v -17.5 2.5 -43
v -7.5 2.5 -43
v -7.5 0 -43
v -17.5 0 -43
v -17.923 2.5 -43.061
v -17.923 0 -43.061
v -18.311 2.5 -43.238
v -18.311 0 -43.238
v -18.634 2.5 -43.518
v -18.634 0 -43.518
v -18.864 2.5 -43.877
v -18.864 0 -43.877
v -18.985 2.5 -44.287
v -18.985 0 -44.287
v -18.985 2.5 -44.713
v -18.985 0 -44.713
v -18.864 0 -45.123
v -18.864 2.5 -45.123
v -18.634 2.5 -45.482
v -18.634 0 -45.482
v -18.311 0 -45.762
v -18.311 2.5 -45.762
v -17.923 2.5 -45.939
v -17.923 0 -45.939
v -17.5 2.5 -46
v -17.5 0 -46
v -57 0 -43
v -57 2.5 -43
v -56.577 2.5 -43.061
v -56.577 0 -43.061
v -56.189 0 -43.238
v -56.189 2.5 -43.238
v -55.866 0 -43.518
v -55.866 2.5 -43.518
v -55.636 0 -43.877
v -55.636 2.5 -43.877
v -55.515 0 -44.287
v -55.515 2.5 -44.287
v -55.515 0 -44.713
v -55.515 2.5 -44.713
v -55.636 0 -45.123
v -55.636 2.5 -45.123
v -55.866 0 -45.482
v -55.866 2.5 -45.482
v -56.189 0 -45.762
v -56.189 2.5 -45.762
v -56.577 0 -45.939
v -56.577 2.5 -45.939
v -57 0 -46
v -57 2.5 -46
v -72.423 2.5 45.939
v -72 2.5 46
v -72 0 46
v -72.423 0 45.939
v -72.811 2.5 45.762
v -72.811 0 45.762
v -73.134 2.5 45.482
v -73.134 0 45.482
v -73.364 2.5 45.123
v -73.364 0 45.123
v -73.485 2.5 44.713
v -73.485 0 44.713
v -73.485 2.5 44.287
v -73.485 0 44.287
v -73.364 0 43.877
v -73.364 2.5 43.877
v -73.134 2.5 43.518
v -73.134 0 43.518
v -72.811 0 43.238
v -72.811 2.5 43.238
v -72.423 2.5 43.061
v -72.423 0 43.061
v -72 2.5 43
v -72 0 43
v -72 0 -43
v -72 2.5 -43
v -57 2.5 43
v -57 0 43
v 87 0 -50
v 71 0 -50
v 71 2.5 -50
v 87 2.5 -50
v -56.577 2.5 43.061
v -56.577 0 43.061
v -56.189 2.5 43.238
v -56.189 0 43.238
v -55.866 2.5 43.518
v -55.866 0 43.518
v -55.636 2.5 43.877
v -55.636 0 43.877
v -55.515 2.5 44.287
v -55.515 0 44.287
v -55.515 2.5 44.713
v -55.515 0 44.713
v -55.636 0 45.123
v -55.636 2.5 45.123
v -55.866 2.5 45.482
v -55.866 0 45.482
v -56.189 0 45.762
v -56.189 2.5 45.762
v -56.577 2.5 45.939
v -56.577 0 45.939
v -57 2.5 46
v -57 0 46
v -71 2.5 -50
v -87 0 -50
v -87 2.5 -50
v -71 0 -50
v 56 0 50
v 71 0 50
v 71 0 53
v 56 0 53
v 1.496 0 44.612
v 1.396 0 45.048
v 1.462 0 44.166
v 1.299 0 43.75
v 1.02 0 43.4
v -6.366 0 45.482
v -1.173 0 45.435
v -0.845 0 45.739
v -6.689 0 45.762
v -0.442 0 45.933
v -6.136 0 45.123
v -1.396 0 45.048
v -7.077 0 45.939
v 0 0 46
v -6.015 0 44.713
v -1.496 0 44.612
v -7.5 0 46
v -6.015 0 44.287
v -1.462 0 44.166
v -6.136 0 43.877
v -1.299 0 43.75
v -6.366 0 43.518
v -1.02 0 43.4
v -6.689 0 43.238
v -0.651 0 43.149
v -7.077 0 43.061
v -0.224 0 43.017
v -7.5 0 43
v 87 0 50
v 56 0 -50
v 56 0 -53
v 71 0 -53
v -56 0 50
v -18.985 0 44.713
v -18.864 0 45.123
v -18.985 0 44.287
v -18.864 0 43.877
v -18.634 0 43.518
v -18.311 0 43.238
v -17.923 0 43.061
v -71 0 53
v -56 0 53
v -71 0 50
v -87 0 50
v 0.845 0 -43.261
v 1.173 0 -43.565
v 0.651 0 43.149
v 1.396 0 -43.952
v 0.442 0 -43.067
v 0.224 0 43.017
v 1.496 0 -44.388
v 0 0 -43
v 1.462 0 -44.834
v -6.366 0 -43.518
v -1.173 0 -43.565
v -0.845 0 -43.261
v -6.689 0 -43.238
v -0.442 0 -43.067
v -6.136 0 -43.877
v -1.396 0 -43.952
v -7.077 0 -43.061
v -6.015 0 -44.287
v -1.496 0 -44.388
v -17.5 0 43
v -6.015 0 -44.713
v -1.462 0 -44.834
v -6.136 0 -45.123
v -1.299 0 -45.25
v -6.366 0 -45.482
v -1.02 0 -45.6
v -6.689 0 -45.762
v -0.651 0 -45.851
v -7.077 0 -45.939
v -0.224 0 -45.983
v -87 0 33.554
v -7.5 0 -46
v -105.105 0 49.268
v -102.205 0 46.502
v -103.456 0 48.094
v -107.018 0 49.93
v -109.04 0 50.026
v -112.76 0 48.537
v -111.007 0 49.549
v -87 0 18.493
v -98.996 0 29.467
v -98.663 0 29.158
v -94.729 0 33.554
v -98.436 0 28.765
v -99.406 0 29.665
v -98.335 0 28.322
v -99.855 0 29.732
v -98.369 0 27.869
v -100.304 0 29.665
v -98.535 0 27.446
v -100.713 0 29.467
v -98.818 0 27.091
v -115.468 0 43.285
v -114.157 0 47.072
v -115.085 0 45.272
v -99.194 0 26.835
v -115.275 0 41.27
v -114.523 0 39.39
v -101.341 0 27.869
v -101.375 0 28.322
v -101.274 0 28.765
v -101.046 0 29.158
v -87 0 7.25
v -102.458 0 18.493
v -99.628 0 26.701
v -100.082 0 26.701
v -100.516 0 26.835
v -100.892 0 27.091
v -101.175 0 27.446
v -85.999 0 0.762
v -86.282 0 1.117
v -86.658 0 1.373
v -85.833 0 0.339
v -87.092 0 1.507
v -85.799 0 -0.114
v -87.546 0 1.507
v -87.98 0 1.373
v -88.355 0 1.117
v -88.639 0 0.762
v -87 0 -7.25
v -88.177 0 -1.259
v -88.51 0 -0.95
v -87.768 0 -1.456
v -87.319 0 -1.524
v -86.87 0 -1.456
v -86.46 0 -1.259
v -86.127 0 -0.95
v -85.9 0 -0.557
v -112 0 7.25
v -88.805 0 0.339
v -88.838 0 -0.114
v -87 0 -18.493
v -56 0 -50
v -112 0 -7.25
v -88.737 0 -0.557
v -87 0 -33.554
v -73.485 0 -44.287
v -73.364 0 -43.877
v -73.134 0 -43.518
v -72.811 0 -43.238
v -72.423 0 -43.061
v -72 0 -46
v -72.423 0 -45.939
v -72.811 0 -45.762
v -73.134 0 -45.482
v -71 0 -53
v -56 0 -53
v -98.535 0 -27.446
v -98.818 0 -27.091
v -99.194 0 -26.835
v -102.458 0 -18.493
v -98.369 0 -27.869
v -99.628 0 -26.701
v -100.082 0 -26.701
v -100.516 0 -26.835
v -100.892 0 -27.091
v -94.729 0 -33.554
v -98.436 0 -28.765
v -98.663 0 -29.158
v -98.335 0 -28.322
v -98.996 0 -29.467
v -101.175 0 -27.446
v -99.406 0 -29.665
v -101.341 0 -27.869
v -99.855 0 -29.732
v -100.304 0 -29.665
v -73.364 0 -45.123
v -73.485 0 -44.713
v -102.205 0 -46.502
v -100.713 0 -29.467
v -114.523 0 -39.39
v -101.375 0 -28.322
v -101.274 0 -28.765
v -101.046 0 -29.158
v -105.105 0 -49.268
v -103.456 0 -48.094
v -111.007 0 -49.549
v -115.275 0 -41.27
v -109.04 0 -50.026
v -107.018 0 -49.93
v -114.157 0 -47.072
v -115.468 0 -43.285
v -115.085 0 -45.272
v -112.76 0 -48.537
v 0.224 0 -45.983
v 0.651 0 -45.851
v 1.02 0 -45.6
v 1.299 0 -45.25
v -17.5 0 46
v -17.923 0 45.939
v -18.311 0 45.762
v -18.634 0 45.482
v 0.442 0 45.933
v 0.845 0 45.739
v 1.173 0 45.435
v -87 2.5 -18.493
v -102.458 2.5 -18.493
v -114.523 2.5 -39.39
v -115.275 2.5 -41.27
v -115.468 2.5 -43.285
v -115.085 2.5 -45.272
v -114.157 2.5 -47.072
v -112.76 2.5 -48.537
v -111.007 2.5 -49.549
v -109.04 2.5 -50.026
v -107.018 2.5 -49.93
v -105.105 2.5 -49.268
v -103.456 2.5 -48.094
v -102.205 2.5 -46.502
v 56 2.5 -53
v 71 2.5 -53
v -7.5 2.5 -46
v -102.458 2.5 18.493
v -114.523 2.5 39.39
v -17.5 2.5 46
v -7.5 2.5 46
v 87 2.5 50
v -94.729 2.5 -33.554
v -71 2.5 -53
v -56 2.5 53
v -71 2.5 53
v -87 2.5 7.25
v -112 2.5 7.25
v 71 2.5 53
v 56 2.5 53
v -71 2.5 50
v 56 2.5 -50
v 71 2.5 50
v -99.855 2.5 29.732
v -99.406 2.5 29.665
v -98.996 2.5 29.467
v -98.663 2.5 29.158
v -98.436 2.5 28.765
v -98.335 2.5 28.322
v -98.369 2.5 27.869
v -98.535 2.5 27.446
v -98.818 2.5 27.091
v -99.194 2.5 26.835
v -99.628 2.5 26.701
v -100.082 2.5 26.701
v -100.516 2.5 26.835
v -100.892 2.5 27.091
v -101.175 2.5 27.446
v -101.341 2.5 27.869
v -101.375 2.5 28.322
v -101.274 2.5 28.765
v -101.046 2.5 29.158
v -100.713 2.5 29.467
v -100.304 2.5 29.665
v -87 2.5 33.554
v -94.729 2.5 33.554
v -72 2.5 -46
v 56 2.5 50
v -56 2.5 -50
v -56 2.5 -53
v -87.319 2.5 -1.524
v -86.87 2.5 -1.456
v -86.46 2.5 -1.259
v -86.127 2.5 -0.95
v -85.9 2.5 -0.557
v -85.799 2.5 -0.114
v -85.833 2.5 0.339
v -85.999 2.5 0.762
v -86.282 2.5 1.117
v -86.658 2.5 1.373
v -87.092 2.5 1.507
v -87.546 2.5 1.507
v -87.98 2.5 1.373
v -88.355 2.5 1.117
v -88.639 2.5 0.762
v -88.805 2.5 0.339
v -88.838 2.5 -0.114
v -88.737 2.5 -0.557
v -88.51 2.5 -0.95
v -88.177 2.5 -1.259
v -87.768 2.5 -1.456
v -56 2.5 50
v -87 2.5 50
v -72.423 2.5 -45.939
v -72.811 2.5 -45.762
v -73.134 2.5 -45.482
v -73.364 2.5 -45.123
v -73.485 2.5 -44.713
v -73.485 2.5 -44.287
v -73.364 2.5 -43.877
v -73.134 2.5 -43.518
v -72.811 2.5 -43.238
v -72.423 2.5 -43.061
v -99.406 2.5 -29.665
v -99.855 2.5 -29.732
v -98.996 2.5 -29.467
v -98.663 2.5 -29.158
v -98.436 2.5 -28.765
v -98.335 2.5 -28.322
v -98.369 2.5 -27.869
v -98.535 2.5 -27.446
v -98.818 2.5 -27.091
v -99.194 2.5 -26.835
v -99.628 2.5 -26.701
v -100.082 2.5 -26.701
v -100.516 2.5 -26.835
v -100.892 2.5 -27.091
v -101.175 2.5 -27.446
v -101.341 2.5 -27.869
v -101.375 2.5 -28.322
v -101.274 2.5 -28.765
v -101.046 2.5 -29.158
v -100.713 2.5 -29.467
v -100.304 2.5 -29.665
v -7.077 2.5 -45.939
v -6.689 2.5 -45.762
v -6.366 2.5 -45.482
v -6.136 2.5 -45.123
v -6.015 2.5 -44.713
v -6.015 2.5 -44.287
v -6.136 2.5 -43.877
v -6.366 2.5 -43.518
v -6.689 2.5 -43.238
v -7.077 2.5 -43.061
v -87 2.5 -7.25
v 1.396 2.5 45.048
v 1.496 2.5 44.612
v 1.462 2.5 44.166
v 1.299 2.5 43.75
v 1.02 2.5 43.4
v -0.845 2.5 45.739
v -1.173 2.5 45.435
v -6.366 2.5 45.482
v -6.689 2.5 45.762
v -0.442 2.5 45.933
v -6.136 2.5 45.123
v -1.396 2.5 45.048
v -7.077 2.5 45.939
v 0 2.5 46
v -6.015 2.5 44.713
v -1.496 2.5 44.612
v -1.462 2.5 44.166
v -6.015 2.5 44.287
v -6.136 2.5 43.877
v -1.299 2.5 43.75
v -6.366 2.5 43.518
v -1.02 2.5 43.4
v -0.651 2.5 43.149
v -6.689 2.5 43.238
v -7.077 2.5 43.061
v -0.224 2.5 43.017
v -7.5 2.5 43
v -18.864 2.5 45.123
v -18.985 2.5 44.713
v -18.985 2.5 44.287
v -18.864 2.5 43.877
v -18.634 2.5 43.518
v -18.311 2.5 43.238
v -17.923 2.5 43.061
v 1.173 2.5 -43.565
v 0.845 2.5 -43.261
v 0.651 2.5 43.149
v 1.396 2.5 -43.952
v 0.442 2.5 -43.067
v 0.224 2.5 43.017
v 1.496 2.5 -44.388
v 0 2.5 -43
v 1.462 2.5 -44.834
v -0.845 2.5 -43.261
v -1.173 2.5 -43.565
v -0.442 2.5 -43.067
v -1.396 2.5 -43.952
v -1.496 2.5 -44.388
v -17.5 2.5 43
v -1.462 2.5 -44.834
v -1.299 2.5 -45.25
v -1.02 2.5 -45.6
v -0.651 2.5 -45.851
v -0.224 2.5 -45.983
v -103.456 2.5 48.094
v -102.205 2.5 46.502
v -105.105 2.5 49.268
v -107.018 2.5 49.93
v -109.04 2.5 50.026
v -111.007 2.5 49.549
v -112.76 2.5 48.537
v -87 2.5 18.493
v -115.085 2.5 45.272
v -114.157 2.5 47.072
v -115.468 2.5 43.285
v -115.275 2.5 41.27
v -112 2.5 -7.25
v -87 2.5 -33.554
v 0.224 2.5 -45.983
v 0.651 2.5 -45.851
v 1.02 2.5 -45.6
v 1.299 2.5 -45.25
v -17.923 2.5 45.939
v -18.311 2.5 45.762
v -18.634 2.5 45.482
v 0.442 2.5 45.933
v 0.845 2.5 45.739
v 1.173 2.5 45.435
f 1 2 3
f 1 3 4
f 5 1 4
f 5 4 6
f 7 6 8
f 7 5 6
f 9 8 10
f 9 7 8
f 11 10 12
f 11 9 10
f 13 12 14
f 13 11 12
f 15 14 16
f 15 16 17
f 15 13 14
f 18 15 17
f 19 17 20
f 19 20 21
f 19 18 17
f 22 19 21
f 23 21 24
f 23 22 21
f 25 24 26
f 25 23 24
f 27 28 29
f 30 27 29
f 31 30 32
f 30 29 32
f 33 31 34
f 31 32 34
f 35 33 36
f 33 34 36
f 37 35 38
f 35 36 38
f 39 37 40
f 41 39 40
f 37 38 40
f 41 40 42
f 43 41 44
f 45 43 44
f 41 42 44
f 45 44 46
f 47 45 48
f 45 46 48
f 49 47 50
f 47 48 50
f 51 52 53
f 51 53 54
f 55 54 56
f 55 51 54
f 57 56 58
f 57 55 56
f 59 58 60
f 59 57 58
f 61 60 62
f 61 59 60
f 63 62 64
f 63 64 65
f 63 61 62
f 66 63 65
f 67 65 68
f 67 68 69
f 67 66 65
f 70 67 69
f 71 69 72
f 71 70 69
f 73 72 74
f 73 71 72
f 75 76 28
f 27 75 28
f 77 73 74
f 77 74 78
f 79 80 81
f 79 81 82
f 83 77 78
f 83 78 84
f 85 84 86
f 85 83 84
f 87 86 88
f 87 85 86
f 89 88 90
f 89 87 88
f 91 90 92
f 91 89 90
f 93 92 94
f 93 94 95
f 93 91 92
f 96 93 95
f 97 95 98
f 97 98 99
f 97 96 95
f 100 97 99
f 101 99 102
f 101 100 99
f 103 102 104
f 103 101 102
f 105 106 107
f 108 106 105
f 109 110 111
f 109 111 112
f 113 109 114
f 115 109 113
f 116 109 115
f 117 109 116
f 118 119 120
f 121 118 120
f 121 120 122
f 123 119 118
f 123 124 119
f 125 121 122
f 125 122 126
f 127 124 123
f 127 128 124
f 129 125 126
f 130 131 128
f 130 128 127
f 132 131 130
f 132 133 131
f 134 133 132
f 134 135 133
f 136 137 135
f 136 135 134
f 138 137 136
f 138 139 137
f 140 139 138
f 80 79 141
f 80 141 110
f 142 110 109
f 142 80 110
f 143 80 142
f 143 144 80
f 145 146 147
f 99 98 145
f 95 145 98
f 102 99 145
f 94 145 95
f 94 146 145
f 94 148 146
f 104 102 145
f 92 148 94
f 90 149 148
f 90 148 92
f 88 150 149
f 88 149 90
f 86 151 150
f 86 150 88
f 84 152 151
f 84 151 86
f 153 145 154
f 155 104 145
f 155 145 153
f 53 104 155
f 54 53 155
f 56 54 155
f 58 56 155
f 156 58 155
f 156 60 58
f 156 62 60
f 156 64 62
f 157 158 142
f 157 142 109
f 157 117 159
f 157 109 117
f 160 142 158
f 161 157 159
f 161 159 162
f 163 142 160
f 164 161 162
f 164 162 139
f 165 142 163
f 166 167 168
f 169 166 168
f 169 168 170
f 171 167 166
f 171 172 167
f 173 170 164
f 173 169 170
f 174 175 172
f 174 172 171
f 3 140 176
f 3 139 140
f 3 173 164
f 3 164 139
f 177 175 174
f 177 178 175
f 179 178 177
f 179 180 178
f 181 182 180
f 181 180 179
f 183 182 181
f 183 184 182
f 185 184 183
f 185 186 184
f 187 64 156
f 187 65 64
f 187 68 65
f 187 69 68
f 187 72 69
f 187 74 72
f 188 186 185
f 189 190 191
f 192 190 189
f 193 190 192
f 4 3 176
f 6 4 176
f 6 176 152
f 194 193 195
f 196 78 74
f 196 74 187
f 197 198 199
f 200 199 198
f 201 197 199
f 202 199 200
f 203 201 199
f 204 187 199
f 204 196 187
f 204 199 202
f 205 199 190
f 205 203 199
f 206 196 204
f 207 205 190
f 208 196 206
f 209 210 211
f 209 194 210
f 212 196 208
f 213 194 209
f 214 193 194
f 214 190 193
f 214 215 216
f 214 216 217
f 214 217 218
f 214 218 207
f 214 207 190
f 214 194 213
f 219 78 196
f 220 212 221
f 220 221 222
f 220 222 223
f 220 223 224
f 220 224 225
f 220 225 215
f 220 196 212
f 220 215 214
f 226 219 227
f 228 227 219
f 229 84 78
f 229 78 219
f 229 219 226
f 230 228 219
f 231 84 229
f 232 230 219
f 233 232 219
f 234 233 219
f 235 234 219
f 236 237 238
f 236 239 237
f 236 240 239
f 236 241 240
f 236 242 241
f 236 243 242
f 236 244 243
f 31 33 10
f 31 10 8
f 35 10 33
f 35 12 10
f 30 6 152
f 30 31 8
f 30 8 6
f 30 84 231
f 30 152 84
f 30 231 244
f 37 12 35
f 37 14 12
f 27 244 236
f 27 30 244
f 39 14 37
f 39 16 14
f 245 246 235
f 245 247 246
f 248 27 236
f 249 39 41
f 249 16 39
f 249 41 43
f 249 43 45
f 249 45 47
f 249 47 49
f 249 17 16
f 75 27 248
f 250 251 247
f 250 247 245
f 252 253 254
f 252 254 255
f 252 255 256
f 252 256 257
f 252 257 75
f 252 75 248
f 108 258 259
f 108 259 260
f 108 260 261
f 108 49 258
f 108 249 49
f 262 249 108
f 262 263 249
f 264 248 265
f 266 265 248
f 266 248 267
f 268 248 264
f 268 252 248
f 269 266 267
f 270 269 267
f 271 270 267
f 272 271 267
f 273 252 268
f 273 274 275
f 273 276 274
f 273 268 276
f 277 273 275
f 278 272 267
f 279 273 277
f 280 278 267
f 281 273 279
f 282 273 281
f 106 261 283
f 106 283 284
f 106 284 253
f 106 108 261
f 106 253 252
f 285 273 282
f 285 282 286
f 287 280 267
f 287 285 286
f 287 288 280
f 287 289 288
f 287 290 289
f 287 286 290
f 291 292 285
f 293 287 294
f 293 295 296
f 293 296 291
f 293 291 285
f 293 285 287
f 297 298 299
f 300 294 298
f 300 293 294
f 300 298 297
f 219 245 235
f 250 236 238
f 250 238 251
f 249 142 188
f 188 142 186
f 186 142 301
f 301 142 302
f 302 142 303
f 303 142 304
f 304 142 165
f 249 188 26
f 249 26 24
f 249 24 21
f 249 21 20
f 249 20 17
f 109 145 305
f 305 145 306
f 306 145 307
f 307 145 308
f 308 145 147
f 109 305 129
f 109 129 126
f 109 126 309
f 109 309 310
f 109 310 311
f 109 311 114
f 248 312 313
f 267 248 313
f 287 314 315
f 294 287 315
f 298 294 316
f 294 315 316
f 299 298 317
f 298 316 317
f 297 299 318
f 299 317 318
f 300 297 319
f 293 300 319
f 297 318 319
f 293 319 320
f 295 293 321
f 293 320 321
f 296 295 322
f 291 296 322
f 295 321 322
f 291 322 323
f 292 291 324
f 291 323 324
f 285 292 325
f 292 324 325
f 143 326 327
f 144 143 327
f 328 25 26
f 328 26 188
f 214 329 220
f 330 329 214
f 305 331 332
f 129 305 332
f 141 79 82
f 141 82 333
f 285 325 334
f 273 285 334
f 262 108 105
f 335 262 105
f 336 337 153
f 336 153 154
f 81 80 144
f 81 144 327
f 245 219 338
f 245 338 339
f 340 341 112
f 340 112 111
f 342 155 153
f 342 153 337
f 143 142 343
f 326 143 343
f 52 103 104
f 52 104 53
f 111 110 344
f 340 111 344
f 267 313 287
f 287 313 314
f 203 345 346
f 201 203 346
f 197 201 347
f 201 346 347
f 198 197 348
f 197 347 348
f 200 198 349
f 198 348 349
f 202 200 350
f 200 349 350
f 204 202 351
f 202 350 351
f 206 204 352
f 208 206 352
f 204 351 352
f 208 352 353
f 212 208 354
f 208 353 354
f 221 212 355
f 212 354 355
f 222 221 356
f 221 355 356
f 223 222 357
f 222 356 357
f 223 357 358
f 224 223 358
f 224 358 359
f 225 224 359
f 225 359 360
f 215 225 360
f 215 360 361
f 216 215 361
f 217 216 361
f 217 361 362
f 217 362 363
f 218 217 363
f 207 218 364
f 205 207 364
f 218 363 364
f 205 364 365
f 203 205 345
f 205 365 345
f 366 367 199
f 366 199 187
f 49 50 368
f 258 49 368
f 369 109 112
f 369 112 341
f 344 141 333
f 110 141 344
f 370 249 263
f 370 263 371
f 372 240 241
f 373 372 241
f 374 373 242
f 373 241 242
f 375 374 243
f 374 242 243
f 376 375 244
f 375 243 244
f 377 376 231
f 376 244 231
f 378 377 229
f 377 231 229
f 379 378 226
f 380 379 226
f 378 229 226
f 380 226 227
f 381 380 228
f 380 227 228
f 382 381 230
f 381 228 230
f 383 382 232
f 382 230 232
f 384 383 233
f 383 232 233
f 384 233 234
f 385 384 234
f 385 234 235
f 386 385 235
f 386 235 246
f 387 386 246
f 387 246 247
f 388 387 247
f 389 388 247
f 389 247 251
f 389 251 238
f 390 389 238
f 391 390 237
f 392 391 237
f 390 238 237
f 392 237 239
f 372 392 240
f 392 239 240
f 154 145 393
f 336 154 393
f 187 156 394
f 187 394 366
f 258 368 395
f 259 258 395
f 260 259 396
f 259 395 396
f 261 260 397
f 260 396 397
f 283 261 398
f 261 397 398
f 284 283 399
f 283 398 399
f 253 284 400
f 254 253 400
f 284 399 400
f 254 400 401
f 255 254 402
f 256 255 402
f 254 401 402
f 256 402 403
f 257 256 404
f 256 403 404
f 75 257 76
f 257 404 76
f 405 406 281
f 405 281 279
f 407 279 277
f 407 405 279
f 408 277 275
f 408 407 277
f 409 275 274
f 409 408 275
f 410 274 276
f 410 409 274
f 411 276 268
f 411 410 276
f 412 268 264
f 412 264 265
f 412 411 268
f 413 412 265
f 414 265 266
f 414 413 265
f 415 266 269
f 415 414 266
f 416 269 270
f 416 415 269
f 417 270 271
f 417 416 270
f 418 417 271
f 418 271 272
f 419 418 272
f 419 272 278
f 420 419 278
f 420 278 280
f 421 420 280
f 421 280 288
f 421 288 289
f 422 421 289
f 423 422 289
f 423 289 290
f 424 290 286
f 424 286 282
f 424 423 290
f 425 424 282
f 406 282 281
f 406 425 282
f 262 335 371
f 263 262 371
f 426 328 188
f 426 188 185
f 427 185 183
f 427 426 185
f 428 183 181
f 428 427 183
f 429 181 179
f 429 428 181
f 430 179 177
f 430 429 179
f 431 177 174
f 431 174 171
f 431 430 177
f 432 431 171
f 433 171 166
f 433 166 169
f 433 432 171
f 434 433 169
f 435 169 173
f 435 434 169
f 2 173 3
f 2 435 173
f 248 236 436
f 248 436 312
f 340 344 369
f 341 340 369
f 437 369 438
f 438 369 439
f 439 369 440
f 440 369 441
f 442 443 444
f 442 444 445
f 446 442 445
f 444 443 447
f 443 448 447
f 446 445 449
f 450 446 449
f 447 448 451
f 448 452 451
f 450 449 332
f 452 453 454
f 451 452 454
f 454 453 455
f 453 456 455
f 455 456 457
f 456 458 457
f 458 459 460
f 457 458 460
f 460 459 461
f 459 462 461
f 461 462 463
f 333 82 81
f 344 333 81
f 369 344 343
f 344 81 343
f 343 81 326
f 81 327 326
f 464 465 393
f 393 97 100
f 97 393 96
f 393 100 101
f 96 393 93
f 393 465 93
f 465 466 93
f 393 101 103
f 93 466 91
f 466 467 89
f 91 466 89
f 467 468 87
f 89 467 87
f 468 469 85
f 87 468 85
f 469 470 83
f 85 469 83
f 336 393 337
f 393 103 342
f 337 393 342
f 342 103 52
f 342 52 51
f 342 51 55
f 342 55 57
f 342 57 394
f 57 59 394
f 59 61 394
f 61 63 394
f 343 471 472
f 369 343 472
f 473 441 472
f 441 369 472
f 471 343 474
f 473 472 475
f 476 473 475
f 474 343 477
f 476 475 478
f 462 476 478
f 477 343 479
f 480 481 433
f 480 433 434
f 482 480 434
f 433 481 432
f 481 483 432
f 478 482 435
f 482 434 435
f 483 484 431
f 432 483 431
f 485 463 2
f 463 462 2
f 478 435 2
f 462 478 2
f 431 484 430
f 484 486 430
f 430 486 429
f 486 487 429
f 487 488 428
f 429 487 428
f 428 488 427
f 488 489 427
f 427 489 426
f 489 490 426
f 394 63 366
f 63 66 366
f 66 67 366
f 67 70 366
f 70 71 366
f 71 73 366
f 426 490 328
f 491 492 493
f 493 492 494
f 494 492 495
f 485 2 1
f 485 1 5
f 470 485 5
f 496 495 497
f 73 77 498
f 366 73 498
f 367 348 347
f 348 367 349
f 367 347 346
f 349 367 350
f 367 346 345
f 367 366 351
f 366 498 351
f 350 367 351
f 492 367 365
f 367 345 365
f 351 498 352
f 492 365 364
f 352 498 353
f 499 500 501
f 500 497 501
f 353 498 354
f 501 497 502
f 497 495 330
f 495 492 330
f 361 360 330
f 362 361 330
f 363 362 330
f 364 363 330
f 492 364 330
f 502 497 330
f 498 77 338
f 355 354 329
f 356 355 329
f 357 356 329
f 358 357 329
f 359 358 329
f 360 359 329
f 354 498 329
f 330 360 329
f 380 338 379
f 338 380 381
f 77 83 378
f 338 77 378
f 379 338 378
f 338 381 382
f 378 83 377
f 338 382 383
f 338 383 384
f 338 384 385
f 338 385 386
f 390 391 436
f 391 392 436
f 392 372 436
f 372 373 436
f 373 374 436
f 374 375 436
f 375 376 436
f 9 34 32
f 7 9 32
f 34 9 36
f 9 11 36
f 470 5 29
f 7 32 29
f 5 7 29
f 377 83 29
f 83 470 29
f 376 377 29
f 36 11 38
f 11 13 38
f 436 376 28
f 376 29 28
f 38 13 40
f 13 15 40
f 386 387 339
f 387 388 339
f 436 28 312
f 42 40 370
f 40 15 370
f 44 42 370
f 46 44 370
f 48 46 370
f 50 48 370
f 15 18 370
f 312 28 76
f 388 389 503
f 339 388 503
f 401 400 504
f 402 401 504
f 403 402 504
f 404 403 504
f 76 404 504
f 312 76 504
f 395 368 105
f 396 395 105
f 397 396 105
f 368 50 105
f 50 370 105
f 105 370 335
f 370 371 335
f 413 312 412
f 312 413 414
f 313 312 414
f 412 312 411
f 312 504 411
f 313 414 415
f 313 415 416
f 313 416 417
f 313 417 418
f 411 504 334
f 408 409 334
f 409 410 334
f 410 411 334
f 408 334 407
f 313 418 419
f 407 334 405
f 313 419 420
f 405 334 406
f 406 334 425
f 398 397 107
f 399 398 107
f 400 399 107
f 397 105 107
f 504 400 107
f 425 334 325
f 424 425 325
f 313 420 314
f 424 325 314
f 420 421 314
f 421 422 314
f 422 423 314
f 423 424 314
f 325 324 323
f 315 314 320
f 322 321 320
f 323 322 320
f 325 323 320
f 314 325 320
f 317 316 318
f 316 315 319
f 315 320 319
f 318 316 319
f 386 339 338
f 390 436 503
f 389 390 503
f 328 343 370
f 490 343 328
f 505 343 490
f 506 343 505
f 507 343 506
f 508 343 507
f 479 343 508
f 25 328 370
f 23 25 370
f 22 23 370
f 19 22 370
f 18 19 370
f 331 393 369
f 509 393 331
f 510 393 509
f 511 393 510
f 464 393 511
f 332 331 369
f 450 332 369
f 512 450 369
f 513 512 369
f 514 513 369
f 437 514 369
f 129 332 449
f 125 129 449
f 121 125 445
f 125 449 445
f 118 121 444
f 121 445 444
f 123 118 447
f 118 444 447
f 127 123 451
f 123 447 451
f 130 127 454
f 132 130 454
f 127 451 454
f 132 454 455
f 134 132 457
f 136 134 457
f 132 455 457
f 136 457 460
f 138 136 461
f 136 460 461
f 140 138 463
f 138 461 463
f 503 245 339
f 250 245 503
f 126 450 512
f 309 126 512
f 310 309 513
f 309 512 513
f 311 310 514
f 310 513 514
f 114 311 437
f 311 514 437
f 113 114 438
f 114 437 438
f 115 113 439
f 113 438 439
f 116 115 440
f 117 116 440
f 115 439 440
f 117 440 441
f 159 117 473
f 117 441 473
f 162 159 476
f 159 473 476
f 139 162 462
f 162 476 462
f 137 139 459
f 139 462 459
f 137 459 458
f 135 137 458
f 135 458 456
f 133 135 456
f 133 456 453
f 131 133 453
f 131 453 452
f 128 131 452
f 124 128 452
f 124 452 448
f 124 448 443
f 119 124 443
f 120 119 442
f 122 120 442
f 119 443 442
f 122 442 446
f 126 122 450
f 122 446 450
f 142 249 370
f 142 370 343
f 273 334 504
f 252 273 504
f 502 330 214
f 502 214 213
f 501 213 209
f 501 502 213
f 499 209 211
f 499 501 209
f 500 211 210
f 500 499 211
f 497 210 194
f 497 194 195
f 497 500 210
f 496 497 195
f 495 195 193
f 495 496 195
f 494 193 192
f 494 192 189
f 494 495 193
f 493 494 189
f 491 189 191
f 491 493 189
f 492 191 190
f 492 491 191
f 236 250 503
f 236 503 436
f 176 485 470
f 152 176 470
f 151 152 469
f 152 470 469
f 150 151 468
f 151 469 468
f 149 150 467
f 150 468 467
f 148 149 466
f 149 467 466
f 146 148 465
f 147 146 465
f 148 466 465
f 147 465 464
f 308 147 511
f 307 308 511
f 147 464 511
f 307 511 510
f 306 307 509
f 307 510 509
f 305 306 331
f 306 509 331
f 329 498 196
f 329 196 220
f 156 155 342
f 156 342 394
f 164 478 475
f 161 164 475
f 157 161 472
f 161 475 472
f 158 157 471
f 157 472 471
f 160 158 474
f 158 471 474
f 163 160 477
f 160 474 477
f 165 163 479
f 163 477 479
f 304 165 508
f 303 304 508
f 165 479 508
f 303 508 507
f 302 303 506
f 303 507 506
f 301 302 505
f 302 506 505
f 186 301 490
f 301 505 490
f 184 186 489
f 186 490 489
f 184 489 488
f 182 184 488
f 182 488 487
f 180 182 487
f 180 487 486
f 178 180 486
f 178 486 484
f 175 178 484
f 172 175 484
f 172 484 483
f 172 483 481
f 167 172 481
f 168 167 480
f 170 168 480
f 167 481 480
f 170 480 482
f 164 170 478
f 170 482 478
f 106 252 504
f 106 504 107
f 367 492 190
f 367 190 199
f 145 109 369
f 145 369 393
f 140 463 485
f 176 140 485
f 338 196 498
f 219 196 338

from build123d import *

# Parameters (mm, degrees)
BOSS_EXTRUDE1_DEPTH = 2.5
SKETCH2_W           = 15
SKETCH2_H           = 2.5
BOSS_EXTRUDE2_DEPTH = 3
SKETCH5_R           = 1.524
BOSS_EXTRUDE4_DEPTH = 2.5
SKETCH6_R           = 1.524
CUT_EXTRUDE1_DEPTH  = 2.5
SKETCH7_R           = 1.5
CUT_EXTRUDE2_DEPTH  = 2.5


with BuildPart() as part:
    # Sketch1 → Boss-Extrude1 (new body)
    with BuildSketch(Plane(origin=(0, 0, 0), x_dir=(1, 0, 0), z_dir=(0, 1, 0))):
        Polygon((-87, -50), (-87, -7.25), (-112, -7.25), (-112, 7.25), (-87, 7.25), (-87, 50), (87, 50), (87, -50), align=None)
    extrude(amount=BOSS_EXTRUDE1_DEPTH)

    # Sketch2 → Boss-Extrude2 (add)
    with BuildSketch(Plane.XY.offset(50)):
        with Locations((-63.5, 1.25)):
            Rectangle(SKETCH2_W, SKETCH2_H)
        with Locations((63.5, 1.25)):
            Rectangle(SKETCH2_W, SKETCH2_H)
    boss_extrude2 = extrude(amount=BOSS_EXTRUDE2_DEPTH)

    # Mirror1: Boss-Extrude2 across plane
    add(boss_extrude2.mirror(Plane.XY))

    # Sketch5 → Boss-Extrude4 (add)
    with BuildSketch(Plane(origin=(0, 2.5, 0), x_dir=(1, 0, 0), z_dir=(0, 1, 0))):
        with BuildLine():
            Line((-102.204774668, -46.50231683), (-94.729060006, -33.553999212))
            Line((-94.729060006, -33.553999212), (-87, -33.553999212))
            Line((-87, -33.553999212), (-87, -18.493123836))
            Line((-87, -18.493123836), (-102.458120011, -18.493123836))
            Line((-102.458120011, -18.493123836), (-114.523120011, -39.39031683))
            ThreePointArc((-114.523120011, -39.39031683), (-111.919947339, -49.105489501), (-102.204774668, -46.50231683))
        make_face()
        with Locations(Location((-99.854947339, -28.208296508, 0), (0, 0, 270))):
            Circle(SKETCH5_R, mode=Mode.SUBTRACT)
    boss_extrude4 = extrude(amount=-BOSS_EXTRUDE4_DEPTH)

    # Sketch6 → Cut-Extrude1 (cut)
    with BuildSketch(Plane.XZ):
        with Locations(Location((-87.318751132, 0, 0), (0, 0, 270))):
            Circle(SKETCH6_R)
    extrude(amount=-CUT_EXTRUDE1_DEPTH, mode=Mode.SUBTRACT)

    # Mirror2: Boss-Extrude4 across plane
    add(boss_extrude4.mirror(Plane.XY))

    # Sketch7 → Cut-Extrude2 (cut)
    with BuildSketch(Plane(origin=(0, 2.5, 0), x_dir=(1, 0, 0), z_dir=(0, 1, 0))):
        with BuildLine():
            ThreePointArc((-57, -43), (-55.5, -44.5), (-57, -46))
            Line((-57, -46), (-72, -46))
            ThreePointArc((-72, -46), (-73.5, -44.5), (-72, -43))
            Line((-72, -43), (-57, -43))
        make_face()
        with BuildLine():
            Line((-17.5, -46), (-7.5, -46))
            ThreePointArc((-7.5, -46), (-6, -44.5), (-7.5, -43))
            Line((-7.5, -43), (-17.5, -43))
            ThreePointArc((-17.5, -43), (-19, -44.5), (-17.5, -46))
        make_face()
        with BuildLine():
            Line((-72, 43), (-57, 43))
            ThreePointArc((-57, 43), (-55.5, 44.5), (-57, 46))
            Line((-57, 46), (-72, 46))
            ThreePointArc((-72, 46), (-73.5, 44.5), (-72, 43))
        make_face()
        with BuildLine():
            ThreePointArc((-7.5, 46), (-6, 44.5), (-7.5, 43))
            Line((-7.5, 43), (-17.5, 43))
            ThreePointArc((-17.5, 43), (-19, 44.5), (-17.5, 46))
            Line((-17.5, 46), (-7.5, 46))
        make_face()
        with Locations(Location((0, 44.5, 0), (0, 0, 270))):
            Circle(SKETCH7_R)
        with Locations(Location((0, -44.5, 0), (0, 0, 270))):
            Circle(SKETCH7_R)
    extrude(amount=-CUT_EXTRUDE2_DEPTH, mode=Mode.SUBTRACT)


solid = part.part
